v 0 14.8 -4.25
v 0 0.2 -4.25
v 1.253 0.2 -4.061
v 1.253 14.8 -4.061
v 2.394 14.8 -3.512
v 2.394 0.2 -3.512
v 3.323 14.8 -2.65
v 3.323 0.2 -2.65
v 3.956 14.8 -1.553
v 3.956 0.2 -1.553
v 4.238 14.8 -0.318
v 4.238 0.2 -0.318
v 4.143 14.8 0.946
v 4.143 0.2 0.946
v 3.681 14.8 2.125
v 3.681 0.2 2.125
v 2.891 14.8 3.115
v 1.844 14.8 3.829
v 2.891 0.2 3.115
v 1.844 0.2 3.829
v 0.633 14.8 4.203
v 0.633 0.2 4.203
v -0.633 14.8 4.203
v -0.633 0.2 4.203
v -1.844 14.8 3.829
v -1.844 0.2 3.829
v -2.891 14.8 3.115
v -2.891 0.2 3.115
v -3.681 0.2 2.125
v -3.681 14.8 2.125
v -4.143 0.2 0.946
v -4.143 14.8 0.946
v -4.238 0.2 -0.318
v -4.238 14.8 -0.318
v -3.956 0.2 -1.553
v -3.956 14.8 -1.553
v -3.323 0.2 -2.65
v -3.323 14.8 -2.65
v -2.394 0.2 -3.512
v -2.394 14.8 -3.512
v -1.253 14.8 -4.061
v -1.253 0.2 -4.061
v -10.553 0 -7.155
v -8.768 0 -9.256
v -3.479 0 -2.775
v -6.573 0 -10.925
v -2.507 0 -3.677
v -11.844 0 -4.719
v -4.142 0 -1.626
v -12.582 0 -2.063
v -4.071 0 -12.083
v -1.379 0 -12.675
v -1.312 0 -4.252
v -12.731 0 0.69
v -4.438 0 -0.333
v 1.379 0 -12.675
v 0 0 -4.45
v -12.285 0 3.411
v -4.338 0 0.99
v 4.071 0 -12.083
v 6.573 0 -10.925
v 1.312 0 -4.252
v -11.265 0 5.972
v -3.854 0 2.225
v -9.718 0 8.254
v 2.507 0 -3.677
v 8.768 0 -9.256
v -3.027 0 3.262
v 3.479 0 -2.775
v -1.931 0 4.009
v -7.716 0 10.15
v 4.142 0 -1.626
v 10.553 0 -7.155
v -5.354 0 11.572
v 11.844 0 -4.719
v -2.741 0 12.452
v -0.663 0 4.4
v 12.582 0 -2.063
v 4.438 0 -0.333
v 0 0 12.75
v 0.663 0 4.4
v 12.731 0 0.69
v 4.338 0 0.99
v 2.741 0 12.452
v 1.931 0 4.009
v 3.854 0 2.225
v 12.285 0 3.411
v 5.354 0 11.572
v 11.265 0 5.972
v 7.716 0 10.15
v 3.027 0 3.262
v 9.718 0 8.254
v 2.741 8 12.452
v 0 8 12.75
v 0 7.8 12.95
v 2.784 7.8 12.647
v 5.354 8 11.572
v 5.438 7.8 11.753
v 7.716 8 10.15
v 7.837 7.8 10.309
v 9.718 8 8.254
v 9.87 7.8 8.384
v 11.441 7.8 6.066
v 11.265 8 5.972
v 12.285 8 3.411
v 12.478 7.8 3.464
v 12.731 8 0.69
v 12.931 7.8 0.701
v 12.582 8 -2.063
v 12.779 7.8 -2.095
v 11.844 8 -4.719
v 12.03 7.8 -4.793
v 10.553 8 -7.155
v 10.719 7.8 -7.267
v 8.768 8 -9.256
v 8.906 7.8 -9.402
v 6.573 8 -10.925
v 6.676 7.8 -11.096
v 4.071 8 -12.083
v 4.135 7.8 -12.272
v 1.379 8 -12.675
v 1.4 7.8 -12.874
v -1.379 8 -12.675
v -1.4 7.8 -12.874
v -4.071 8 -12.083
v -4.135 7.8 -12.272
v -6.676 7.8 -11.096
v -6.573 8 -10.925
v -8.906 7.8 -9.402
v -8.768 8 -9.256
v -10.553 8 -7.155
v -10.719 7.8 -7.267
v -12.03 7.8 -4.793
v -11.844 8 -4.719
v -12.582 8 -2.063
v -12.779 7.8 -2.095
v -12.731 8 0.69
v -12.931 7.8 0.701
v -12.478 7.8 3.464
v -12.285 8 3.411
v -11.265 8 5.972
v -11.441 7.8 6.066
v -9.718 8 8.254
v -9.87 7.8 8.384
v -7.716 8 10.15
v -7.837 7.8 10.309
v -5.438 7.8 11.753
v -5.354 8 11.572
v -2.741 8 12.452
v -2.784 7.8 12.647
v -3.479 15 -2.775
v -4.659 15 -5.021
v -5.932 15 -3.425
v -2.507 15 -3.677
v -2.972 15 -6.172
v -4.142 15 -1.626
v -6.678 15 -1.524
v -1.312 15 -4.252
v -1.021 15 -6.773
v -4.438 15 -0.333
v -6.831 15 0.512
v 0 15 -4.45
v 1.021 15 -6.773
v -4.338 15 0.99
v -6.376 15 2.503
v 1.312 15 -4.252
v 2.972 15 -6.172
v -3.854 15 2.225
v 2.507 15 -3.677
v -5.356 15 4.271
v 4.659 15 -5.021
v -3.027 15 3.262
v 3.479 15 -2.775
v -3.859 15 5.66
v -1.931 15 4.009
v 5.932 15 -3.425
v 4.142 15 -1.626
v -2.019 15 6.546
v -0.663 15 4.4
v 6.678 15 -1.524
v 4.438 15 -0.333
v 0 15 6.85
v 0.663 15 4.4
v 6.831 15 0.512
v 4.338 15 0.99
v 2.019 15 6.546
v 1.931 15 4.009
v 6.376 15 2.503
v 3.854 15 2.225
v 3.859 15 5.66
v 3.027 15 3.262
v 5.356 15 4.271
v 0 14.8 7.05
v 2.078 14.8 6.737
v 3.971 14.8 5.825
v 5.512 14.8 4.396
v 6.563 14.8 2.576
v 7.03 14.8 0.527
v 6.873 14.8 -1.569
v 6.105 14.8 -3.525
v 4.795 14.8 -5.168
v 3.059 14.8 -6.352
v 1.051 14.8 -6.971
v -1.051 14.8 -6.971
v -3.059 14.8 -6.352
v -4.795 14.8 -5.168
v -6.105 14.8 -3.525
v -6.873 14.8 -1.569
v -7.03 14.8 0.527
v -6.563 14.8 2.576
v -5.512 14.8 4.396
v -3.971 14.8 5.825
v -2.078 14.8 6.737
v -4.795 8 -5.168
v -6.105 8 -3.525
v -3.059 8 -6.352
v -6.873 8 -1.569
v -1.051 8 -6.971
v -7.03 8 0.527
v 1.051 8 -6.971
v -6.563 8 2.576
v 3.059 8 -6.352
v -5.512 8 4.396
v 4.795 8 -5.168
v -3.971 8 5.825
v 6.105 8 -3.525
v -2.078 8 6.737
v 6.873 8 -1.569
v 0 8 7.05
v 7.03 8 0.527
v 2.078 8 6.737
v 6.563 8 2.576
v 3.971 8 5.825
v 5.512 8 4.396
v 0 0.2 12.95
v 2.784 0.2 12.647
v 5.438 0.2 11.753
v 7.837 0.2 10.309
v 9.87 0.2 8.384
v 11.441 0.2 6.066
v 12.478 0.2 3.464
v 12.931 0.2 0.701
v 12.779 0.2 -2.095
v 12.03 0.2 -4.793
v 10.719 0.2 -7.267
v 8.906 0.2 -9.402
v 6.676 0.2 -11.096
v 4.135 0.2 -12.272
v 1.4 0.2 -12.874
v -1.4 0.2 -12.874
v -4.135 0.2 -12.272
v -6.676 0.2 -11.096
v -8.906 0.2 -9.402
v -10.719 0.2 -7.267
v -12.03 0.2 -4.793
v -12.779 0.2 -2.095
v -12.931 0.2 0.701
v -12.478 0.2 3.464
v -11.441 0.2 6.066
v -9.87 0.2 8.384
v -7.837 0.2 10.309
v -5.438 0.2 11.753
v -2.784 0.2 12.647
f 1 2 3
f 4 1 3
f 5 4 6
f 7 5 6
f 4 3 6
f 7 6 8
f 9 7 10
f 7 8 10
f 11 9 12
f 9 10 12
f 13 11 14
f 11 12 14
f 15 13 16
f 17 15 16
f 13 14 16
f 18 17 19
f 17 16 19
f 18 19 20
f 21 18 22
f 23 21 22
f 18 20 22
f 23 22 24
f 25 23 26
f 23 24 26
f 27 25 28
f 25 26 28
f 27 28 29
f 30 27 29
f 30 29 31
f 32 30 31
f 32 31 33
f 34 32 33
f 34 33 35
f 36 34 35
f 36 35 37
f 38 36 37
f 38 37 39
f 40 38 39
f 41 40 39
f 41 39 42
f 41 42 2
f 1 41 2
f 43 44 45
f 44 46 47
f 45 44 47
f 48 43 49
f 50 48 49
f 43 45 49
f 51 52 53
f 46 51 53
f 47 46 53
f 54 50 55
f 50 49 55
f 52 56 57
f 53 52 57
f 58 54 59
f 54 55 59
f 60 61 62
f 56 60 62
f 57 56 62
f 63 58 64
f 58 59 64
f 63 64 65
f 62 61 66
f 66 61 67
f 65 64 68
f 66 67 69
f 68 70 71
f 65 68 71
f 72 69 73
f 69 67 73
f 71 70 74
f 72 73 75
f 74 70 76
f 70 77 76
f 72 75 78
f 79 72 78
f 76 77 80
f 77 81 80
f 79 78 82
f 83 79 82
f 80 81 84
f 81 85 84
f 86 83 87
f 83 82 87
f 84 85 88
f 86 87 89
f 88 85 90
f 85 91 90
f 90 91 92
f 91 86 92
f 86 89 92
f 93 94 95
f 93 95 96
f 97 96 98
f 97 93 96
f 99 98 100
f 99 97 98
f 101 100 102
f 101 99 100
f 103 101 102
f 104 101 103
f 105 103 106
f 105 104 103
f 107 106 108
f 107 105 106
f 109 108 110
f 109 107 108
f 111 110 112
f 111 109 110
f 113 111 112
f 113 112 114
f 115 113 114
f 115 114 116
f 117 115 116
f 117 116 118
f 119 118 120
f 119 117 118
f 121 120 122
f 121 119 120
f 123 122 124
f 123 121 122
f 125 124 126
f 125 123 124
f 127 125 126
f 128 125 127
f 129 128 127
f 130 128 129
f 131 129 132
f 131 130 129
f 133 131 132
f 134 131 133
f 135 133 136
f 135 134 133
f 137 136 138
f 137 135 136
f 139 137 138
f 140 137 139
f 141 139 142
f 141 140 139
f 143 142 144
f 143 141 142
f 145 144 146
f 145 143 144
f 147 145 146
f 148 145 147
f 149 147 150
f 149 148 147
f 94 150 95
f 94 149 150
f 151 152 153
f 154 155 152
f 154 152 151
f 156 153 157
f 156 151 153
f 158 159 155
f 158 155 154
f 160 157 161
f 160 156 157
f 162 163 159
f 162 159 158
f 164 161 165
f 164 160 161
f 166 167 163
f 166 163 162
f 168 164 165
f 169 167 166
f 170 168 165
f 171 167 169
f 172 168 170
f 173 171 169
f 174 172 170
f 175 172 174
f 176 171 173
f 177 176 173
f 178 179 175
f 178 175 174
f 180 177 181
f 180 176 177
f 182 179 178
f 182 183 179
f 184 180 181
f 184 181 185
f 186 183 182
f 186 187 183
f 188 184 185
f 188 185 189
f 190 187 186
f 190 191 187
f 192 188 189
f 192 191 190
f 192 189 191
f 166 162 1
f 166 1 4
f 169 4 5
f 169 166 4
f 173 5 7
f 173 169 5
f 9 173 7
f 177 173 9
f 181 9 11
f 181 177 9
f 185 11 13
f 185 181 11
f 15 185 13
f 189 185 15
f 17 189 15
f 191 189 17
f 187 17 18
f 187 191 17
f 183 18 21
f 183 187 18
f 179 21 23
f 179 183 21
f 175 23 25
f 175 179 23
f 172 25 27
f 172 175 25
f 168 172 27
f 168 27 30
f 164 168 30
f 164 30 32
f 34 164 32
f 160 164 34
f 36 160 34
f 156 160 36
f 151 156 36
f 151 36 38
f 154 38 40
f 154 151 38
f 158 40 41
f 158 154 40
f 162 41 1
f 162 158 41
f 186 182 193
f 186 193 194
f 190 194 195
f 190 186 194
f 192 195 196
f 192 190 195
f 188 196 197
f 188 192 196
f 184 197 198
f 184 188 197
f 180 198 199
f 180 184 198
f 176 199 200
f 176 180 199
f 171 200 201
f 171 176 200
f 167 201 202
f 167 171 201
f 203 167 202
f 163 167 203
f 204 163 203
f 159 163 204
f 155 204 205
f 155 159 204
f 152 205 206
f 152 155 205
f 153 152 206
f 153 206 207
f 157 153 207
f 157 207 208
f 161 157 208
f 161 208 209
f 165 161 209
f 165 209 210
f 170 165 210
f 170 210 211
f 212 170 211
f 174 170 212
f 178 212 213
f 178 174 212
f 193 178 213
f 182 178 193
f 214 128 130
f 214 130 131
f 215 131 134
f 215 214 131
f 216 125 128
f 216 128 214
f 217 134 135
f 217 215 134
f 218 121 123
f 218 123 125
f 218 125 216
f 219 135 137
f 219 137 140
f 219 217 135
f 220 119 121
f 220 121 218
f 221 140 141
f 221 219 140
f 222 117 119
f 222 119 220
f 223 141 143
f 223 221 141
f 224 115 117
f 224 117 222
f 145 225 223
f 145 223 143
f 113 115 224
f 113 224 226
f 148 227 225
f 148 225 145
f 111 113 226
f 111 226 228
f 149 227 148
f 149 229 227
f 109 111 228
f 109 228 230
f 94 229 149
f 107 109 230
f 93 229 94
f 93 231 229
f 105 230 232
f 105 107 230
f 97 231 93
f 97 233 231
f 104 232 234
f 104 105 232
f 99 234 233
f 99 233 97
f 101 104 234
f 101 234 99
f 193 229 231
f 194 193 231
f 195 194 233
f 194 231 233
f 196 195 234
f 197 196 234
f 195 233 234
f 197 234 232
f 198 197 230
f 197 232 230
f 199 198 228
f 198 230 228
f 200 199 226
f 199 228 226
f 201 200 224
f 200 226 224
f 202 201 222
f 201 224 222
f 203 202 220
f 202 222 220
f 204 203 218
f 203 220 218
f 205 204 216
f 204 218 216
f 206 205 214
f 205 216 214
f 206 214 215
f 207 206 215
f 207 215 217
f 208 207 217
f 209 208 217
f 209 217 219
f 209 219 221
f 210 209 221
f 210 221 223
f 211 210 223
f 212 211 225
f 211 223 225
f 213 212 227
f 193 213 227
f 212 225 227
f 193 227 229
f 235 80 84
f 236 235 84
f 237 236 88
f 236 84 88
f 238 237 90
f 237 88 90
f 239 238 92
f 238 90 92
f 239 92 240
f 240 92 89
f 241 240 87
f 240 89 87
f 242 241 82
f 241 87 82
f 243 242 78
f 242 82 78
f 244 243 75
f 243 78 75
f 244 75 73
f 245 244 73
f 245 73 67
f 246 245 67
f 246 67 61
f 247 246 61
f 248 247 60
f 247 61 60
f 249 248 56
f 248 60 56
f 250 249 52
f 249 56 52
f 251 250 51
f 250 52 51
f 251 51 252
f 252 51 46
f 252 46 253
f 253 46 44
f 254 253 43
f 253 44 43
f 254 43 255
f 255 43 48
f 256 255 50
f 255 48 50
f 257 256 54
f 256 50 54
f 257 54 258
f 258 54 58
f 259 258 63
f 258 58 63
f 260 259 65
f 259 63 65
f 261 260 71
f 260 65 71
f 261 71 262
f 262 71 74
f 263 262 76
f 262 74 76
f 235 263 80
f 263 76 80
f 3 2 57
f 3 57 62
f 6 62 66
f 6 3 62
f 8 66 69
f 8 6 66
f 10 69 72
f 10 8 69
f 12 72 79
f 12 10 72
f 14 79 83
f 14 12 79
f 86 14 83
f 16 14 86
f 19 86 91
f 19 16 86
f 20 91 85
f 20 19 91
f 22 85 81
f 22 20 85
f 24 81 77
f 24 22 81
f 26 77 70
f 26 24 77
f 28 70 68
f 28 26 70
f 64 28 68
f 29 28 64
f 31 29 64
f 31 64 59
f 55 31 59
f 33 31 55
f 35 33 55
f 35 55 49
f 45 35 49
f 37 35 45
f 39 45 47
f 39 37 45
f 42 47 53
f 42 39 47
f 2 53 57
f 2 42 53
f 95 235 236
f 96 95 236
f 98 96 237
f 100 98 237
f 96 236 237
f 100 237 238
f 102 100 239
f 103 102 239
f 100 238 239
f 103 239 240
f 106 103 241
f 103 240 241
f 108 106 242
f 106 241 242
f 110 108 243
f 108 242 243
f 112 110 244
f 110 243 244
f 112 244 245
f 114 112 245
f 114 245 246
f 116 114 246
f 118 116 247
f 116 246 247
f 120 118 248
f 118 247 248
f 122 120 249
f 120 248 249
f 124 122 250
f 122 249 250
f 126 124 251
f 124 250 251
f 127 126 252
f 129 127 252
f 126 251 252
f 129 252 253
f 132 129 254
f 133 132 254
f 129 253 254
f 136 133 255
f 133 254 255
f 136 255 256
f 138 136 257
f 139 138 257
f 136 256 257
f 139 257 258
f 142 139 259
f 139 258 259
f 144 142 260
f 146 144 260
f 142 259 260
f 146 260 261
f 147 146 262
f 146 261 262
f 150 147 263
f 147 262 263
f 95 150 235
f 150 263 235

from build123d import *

# Parameters (mm, degrees)
SKETCH_1_R          = 12.95
EXTRUDE_1_DEPTH     = 8
SKETCH_2_R          = 7.05
EXTRUDE_2_DEPTH     = 7
SKETCH_3_R          = 4.25
CUT_EXTRUDE_1_DEPTH = 24.672874773
CHAMFER_1_SIZE      = 0.2


with BuildPart() as part:
    # 草图1 → 凸台-拉伸1 (new body)
    with BuildSketch(Plane(origin=(0, 0, 0), x_dir=(1, 0, 0), z_dir=(0, 1, 0))):
        with Locations(Location((0, 0, 0), (0, 0, 270))):
            Circle(SKETCH_1_R)
    extrude(amount=EXTRUDE_1_DEPTH)

    # 草图2 → 凸台-拉伸2 (add)
    with BuildSketch(Plane(origin=(0, 8, 0), x_dir=(1, 0, 0), z_dir=(0, 1, 0))):
        with Locations(Location((0, 0, 0), (0, 0, 270))):
            Circle(SKETCH_2_R)
    extrude(amount=EXTRUDE_2_DEPTH)

    # 草图3 → 切除-拉伸1 (cut, through all)
    with BuildSketch(Plane.XZ):
        with Locations(Location((0, 0, 0), (0, 0, 270))):
            Circle(SKETCH_3_R)
    extrude(amount=-CUT_EXTRUDE_1_DEPTH, mode=Mode.SUBTRACT)

    # 倒角1
    chamfer_1_edges = [part.edges().sort_by_distance(p)[0] for p in [
        (0, 15, 4.25),
        (0, 0, 4.25),
        (0, 0, -12.95),
        (0, 8, -12.95),
        (0, 15, -7.05),
    ]]
    chamfer(chamfer_1_edges, length=CHAMFER_1_SIZE)


solid = part.part
